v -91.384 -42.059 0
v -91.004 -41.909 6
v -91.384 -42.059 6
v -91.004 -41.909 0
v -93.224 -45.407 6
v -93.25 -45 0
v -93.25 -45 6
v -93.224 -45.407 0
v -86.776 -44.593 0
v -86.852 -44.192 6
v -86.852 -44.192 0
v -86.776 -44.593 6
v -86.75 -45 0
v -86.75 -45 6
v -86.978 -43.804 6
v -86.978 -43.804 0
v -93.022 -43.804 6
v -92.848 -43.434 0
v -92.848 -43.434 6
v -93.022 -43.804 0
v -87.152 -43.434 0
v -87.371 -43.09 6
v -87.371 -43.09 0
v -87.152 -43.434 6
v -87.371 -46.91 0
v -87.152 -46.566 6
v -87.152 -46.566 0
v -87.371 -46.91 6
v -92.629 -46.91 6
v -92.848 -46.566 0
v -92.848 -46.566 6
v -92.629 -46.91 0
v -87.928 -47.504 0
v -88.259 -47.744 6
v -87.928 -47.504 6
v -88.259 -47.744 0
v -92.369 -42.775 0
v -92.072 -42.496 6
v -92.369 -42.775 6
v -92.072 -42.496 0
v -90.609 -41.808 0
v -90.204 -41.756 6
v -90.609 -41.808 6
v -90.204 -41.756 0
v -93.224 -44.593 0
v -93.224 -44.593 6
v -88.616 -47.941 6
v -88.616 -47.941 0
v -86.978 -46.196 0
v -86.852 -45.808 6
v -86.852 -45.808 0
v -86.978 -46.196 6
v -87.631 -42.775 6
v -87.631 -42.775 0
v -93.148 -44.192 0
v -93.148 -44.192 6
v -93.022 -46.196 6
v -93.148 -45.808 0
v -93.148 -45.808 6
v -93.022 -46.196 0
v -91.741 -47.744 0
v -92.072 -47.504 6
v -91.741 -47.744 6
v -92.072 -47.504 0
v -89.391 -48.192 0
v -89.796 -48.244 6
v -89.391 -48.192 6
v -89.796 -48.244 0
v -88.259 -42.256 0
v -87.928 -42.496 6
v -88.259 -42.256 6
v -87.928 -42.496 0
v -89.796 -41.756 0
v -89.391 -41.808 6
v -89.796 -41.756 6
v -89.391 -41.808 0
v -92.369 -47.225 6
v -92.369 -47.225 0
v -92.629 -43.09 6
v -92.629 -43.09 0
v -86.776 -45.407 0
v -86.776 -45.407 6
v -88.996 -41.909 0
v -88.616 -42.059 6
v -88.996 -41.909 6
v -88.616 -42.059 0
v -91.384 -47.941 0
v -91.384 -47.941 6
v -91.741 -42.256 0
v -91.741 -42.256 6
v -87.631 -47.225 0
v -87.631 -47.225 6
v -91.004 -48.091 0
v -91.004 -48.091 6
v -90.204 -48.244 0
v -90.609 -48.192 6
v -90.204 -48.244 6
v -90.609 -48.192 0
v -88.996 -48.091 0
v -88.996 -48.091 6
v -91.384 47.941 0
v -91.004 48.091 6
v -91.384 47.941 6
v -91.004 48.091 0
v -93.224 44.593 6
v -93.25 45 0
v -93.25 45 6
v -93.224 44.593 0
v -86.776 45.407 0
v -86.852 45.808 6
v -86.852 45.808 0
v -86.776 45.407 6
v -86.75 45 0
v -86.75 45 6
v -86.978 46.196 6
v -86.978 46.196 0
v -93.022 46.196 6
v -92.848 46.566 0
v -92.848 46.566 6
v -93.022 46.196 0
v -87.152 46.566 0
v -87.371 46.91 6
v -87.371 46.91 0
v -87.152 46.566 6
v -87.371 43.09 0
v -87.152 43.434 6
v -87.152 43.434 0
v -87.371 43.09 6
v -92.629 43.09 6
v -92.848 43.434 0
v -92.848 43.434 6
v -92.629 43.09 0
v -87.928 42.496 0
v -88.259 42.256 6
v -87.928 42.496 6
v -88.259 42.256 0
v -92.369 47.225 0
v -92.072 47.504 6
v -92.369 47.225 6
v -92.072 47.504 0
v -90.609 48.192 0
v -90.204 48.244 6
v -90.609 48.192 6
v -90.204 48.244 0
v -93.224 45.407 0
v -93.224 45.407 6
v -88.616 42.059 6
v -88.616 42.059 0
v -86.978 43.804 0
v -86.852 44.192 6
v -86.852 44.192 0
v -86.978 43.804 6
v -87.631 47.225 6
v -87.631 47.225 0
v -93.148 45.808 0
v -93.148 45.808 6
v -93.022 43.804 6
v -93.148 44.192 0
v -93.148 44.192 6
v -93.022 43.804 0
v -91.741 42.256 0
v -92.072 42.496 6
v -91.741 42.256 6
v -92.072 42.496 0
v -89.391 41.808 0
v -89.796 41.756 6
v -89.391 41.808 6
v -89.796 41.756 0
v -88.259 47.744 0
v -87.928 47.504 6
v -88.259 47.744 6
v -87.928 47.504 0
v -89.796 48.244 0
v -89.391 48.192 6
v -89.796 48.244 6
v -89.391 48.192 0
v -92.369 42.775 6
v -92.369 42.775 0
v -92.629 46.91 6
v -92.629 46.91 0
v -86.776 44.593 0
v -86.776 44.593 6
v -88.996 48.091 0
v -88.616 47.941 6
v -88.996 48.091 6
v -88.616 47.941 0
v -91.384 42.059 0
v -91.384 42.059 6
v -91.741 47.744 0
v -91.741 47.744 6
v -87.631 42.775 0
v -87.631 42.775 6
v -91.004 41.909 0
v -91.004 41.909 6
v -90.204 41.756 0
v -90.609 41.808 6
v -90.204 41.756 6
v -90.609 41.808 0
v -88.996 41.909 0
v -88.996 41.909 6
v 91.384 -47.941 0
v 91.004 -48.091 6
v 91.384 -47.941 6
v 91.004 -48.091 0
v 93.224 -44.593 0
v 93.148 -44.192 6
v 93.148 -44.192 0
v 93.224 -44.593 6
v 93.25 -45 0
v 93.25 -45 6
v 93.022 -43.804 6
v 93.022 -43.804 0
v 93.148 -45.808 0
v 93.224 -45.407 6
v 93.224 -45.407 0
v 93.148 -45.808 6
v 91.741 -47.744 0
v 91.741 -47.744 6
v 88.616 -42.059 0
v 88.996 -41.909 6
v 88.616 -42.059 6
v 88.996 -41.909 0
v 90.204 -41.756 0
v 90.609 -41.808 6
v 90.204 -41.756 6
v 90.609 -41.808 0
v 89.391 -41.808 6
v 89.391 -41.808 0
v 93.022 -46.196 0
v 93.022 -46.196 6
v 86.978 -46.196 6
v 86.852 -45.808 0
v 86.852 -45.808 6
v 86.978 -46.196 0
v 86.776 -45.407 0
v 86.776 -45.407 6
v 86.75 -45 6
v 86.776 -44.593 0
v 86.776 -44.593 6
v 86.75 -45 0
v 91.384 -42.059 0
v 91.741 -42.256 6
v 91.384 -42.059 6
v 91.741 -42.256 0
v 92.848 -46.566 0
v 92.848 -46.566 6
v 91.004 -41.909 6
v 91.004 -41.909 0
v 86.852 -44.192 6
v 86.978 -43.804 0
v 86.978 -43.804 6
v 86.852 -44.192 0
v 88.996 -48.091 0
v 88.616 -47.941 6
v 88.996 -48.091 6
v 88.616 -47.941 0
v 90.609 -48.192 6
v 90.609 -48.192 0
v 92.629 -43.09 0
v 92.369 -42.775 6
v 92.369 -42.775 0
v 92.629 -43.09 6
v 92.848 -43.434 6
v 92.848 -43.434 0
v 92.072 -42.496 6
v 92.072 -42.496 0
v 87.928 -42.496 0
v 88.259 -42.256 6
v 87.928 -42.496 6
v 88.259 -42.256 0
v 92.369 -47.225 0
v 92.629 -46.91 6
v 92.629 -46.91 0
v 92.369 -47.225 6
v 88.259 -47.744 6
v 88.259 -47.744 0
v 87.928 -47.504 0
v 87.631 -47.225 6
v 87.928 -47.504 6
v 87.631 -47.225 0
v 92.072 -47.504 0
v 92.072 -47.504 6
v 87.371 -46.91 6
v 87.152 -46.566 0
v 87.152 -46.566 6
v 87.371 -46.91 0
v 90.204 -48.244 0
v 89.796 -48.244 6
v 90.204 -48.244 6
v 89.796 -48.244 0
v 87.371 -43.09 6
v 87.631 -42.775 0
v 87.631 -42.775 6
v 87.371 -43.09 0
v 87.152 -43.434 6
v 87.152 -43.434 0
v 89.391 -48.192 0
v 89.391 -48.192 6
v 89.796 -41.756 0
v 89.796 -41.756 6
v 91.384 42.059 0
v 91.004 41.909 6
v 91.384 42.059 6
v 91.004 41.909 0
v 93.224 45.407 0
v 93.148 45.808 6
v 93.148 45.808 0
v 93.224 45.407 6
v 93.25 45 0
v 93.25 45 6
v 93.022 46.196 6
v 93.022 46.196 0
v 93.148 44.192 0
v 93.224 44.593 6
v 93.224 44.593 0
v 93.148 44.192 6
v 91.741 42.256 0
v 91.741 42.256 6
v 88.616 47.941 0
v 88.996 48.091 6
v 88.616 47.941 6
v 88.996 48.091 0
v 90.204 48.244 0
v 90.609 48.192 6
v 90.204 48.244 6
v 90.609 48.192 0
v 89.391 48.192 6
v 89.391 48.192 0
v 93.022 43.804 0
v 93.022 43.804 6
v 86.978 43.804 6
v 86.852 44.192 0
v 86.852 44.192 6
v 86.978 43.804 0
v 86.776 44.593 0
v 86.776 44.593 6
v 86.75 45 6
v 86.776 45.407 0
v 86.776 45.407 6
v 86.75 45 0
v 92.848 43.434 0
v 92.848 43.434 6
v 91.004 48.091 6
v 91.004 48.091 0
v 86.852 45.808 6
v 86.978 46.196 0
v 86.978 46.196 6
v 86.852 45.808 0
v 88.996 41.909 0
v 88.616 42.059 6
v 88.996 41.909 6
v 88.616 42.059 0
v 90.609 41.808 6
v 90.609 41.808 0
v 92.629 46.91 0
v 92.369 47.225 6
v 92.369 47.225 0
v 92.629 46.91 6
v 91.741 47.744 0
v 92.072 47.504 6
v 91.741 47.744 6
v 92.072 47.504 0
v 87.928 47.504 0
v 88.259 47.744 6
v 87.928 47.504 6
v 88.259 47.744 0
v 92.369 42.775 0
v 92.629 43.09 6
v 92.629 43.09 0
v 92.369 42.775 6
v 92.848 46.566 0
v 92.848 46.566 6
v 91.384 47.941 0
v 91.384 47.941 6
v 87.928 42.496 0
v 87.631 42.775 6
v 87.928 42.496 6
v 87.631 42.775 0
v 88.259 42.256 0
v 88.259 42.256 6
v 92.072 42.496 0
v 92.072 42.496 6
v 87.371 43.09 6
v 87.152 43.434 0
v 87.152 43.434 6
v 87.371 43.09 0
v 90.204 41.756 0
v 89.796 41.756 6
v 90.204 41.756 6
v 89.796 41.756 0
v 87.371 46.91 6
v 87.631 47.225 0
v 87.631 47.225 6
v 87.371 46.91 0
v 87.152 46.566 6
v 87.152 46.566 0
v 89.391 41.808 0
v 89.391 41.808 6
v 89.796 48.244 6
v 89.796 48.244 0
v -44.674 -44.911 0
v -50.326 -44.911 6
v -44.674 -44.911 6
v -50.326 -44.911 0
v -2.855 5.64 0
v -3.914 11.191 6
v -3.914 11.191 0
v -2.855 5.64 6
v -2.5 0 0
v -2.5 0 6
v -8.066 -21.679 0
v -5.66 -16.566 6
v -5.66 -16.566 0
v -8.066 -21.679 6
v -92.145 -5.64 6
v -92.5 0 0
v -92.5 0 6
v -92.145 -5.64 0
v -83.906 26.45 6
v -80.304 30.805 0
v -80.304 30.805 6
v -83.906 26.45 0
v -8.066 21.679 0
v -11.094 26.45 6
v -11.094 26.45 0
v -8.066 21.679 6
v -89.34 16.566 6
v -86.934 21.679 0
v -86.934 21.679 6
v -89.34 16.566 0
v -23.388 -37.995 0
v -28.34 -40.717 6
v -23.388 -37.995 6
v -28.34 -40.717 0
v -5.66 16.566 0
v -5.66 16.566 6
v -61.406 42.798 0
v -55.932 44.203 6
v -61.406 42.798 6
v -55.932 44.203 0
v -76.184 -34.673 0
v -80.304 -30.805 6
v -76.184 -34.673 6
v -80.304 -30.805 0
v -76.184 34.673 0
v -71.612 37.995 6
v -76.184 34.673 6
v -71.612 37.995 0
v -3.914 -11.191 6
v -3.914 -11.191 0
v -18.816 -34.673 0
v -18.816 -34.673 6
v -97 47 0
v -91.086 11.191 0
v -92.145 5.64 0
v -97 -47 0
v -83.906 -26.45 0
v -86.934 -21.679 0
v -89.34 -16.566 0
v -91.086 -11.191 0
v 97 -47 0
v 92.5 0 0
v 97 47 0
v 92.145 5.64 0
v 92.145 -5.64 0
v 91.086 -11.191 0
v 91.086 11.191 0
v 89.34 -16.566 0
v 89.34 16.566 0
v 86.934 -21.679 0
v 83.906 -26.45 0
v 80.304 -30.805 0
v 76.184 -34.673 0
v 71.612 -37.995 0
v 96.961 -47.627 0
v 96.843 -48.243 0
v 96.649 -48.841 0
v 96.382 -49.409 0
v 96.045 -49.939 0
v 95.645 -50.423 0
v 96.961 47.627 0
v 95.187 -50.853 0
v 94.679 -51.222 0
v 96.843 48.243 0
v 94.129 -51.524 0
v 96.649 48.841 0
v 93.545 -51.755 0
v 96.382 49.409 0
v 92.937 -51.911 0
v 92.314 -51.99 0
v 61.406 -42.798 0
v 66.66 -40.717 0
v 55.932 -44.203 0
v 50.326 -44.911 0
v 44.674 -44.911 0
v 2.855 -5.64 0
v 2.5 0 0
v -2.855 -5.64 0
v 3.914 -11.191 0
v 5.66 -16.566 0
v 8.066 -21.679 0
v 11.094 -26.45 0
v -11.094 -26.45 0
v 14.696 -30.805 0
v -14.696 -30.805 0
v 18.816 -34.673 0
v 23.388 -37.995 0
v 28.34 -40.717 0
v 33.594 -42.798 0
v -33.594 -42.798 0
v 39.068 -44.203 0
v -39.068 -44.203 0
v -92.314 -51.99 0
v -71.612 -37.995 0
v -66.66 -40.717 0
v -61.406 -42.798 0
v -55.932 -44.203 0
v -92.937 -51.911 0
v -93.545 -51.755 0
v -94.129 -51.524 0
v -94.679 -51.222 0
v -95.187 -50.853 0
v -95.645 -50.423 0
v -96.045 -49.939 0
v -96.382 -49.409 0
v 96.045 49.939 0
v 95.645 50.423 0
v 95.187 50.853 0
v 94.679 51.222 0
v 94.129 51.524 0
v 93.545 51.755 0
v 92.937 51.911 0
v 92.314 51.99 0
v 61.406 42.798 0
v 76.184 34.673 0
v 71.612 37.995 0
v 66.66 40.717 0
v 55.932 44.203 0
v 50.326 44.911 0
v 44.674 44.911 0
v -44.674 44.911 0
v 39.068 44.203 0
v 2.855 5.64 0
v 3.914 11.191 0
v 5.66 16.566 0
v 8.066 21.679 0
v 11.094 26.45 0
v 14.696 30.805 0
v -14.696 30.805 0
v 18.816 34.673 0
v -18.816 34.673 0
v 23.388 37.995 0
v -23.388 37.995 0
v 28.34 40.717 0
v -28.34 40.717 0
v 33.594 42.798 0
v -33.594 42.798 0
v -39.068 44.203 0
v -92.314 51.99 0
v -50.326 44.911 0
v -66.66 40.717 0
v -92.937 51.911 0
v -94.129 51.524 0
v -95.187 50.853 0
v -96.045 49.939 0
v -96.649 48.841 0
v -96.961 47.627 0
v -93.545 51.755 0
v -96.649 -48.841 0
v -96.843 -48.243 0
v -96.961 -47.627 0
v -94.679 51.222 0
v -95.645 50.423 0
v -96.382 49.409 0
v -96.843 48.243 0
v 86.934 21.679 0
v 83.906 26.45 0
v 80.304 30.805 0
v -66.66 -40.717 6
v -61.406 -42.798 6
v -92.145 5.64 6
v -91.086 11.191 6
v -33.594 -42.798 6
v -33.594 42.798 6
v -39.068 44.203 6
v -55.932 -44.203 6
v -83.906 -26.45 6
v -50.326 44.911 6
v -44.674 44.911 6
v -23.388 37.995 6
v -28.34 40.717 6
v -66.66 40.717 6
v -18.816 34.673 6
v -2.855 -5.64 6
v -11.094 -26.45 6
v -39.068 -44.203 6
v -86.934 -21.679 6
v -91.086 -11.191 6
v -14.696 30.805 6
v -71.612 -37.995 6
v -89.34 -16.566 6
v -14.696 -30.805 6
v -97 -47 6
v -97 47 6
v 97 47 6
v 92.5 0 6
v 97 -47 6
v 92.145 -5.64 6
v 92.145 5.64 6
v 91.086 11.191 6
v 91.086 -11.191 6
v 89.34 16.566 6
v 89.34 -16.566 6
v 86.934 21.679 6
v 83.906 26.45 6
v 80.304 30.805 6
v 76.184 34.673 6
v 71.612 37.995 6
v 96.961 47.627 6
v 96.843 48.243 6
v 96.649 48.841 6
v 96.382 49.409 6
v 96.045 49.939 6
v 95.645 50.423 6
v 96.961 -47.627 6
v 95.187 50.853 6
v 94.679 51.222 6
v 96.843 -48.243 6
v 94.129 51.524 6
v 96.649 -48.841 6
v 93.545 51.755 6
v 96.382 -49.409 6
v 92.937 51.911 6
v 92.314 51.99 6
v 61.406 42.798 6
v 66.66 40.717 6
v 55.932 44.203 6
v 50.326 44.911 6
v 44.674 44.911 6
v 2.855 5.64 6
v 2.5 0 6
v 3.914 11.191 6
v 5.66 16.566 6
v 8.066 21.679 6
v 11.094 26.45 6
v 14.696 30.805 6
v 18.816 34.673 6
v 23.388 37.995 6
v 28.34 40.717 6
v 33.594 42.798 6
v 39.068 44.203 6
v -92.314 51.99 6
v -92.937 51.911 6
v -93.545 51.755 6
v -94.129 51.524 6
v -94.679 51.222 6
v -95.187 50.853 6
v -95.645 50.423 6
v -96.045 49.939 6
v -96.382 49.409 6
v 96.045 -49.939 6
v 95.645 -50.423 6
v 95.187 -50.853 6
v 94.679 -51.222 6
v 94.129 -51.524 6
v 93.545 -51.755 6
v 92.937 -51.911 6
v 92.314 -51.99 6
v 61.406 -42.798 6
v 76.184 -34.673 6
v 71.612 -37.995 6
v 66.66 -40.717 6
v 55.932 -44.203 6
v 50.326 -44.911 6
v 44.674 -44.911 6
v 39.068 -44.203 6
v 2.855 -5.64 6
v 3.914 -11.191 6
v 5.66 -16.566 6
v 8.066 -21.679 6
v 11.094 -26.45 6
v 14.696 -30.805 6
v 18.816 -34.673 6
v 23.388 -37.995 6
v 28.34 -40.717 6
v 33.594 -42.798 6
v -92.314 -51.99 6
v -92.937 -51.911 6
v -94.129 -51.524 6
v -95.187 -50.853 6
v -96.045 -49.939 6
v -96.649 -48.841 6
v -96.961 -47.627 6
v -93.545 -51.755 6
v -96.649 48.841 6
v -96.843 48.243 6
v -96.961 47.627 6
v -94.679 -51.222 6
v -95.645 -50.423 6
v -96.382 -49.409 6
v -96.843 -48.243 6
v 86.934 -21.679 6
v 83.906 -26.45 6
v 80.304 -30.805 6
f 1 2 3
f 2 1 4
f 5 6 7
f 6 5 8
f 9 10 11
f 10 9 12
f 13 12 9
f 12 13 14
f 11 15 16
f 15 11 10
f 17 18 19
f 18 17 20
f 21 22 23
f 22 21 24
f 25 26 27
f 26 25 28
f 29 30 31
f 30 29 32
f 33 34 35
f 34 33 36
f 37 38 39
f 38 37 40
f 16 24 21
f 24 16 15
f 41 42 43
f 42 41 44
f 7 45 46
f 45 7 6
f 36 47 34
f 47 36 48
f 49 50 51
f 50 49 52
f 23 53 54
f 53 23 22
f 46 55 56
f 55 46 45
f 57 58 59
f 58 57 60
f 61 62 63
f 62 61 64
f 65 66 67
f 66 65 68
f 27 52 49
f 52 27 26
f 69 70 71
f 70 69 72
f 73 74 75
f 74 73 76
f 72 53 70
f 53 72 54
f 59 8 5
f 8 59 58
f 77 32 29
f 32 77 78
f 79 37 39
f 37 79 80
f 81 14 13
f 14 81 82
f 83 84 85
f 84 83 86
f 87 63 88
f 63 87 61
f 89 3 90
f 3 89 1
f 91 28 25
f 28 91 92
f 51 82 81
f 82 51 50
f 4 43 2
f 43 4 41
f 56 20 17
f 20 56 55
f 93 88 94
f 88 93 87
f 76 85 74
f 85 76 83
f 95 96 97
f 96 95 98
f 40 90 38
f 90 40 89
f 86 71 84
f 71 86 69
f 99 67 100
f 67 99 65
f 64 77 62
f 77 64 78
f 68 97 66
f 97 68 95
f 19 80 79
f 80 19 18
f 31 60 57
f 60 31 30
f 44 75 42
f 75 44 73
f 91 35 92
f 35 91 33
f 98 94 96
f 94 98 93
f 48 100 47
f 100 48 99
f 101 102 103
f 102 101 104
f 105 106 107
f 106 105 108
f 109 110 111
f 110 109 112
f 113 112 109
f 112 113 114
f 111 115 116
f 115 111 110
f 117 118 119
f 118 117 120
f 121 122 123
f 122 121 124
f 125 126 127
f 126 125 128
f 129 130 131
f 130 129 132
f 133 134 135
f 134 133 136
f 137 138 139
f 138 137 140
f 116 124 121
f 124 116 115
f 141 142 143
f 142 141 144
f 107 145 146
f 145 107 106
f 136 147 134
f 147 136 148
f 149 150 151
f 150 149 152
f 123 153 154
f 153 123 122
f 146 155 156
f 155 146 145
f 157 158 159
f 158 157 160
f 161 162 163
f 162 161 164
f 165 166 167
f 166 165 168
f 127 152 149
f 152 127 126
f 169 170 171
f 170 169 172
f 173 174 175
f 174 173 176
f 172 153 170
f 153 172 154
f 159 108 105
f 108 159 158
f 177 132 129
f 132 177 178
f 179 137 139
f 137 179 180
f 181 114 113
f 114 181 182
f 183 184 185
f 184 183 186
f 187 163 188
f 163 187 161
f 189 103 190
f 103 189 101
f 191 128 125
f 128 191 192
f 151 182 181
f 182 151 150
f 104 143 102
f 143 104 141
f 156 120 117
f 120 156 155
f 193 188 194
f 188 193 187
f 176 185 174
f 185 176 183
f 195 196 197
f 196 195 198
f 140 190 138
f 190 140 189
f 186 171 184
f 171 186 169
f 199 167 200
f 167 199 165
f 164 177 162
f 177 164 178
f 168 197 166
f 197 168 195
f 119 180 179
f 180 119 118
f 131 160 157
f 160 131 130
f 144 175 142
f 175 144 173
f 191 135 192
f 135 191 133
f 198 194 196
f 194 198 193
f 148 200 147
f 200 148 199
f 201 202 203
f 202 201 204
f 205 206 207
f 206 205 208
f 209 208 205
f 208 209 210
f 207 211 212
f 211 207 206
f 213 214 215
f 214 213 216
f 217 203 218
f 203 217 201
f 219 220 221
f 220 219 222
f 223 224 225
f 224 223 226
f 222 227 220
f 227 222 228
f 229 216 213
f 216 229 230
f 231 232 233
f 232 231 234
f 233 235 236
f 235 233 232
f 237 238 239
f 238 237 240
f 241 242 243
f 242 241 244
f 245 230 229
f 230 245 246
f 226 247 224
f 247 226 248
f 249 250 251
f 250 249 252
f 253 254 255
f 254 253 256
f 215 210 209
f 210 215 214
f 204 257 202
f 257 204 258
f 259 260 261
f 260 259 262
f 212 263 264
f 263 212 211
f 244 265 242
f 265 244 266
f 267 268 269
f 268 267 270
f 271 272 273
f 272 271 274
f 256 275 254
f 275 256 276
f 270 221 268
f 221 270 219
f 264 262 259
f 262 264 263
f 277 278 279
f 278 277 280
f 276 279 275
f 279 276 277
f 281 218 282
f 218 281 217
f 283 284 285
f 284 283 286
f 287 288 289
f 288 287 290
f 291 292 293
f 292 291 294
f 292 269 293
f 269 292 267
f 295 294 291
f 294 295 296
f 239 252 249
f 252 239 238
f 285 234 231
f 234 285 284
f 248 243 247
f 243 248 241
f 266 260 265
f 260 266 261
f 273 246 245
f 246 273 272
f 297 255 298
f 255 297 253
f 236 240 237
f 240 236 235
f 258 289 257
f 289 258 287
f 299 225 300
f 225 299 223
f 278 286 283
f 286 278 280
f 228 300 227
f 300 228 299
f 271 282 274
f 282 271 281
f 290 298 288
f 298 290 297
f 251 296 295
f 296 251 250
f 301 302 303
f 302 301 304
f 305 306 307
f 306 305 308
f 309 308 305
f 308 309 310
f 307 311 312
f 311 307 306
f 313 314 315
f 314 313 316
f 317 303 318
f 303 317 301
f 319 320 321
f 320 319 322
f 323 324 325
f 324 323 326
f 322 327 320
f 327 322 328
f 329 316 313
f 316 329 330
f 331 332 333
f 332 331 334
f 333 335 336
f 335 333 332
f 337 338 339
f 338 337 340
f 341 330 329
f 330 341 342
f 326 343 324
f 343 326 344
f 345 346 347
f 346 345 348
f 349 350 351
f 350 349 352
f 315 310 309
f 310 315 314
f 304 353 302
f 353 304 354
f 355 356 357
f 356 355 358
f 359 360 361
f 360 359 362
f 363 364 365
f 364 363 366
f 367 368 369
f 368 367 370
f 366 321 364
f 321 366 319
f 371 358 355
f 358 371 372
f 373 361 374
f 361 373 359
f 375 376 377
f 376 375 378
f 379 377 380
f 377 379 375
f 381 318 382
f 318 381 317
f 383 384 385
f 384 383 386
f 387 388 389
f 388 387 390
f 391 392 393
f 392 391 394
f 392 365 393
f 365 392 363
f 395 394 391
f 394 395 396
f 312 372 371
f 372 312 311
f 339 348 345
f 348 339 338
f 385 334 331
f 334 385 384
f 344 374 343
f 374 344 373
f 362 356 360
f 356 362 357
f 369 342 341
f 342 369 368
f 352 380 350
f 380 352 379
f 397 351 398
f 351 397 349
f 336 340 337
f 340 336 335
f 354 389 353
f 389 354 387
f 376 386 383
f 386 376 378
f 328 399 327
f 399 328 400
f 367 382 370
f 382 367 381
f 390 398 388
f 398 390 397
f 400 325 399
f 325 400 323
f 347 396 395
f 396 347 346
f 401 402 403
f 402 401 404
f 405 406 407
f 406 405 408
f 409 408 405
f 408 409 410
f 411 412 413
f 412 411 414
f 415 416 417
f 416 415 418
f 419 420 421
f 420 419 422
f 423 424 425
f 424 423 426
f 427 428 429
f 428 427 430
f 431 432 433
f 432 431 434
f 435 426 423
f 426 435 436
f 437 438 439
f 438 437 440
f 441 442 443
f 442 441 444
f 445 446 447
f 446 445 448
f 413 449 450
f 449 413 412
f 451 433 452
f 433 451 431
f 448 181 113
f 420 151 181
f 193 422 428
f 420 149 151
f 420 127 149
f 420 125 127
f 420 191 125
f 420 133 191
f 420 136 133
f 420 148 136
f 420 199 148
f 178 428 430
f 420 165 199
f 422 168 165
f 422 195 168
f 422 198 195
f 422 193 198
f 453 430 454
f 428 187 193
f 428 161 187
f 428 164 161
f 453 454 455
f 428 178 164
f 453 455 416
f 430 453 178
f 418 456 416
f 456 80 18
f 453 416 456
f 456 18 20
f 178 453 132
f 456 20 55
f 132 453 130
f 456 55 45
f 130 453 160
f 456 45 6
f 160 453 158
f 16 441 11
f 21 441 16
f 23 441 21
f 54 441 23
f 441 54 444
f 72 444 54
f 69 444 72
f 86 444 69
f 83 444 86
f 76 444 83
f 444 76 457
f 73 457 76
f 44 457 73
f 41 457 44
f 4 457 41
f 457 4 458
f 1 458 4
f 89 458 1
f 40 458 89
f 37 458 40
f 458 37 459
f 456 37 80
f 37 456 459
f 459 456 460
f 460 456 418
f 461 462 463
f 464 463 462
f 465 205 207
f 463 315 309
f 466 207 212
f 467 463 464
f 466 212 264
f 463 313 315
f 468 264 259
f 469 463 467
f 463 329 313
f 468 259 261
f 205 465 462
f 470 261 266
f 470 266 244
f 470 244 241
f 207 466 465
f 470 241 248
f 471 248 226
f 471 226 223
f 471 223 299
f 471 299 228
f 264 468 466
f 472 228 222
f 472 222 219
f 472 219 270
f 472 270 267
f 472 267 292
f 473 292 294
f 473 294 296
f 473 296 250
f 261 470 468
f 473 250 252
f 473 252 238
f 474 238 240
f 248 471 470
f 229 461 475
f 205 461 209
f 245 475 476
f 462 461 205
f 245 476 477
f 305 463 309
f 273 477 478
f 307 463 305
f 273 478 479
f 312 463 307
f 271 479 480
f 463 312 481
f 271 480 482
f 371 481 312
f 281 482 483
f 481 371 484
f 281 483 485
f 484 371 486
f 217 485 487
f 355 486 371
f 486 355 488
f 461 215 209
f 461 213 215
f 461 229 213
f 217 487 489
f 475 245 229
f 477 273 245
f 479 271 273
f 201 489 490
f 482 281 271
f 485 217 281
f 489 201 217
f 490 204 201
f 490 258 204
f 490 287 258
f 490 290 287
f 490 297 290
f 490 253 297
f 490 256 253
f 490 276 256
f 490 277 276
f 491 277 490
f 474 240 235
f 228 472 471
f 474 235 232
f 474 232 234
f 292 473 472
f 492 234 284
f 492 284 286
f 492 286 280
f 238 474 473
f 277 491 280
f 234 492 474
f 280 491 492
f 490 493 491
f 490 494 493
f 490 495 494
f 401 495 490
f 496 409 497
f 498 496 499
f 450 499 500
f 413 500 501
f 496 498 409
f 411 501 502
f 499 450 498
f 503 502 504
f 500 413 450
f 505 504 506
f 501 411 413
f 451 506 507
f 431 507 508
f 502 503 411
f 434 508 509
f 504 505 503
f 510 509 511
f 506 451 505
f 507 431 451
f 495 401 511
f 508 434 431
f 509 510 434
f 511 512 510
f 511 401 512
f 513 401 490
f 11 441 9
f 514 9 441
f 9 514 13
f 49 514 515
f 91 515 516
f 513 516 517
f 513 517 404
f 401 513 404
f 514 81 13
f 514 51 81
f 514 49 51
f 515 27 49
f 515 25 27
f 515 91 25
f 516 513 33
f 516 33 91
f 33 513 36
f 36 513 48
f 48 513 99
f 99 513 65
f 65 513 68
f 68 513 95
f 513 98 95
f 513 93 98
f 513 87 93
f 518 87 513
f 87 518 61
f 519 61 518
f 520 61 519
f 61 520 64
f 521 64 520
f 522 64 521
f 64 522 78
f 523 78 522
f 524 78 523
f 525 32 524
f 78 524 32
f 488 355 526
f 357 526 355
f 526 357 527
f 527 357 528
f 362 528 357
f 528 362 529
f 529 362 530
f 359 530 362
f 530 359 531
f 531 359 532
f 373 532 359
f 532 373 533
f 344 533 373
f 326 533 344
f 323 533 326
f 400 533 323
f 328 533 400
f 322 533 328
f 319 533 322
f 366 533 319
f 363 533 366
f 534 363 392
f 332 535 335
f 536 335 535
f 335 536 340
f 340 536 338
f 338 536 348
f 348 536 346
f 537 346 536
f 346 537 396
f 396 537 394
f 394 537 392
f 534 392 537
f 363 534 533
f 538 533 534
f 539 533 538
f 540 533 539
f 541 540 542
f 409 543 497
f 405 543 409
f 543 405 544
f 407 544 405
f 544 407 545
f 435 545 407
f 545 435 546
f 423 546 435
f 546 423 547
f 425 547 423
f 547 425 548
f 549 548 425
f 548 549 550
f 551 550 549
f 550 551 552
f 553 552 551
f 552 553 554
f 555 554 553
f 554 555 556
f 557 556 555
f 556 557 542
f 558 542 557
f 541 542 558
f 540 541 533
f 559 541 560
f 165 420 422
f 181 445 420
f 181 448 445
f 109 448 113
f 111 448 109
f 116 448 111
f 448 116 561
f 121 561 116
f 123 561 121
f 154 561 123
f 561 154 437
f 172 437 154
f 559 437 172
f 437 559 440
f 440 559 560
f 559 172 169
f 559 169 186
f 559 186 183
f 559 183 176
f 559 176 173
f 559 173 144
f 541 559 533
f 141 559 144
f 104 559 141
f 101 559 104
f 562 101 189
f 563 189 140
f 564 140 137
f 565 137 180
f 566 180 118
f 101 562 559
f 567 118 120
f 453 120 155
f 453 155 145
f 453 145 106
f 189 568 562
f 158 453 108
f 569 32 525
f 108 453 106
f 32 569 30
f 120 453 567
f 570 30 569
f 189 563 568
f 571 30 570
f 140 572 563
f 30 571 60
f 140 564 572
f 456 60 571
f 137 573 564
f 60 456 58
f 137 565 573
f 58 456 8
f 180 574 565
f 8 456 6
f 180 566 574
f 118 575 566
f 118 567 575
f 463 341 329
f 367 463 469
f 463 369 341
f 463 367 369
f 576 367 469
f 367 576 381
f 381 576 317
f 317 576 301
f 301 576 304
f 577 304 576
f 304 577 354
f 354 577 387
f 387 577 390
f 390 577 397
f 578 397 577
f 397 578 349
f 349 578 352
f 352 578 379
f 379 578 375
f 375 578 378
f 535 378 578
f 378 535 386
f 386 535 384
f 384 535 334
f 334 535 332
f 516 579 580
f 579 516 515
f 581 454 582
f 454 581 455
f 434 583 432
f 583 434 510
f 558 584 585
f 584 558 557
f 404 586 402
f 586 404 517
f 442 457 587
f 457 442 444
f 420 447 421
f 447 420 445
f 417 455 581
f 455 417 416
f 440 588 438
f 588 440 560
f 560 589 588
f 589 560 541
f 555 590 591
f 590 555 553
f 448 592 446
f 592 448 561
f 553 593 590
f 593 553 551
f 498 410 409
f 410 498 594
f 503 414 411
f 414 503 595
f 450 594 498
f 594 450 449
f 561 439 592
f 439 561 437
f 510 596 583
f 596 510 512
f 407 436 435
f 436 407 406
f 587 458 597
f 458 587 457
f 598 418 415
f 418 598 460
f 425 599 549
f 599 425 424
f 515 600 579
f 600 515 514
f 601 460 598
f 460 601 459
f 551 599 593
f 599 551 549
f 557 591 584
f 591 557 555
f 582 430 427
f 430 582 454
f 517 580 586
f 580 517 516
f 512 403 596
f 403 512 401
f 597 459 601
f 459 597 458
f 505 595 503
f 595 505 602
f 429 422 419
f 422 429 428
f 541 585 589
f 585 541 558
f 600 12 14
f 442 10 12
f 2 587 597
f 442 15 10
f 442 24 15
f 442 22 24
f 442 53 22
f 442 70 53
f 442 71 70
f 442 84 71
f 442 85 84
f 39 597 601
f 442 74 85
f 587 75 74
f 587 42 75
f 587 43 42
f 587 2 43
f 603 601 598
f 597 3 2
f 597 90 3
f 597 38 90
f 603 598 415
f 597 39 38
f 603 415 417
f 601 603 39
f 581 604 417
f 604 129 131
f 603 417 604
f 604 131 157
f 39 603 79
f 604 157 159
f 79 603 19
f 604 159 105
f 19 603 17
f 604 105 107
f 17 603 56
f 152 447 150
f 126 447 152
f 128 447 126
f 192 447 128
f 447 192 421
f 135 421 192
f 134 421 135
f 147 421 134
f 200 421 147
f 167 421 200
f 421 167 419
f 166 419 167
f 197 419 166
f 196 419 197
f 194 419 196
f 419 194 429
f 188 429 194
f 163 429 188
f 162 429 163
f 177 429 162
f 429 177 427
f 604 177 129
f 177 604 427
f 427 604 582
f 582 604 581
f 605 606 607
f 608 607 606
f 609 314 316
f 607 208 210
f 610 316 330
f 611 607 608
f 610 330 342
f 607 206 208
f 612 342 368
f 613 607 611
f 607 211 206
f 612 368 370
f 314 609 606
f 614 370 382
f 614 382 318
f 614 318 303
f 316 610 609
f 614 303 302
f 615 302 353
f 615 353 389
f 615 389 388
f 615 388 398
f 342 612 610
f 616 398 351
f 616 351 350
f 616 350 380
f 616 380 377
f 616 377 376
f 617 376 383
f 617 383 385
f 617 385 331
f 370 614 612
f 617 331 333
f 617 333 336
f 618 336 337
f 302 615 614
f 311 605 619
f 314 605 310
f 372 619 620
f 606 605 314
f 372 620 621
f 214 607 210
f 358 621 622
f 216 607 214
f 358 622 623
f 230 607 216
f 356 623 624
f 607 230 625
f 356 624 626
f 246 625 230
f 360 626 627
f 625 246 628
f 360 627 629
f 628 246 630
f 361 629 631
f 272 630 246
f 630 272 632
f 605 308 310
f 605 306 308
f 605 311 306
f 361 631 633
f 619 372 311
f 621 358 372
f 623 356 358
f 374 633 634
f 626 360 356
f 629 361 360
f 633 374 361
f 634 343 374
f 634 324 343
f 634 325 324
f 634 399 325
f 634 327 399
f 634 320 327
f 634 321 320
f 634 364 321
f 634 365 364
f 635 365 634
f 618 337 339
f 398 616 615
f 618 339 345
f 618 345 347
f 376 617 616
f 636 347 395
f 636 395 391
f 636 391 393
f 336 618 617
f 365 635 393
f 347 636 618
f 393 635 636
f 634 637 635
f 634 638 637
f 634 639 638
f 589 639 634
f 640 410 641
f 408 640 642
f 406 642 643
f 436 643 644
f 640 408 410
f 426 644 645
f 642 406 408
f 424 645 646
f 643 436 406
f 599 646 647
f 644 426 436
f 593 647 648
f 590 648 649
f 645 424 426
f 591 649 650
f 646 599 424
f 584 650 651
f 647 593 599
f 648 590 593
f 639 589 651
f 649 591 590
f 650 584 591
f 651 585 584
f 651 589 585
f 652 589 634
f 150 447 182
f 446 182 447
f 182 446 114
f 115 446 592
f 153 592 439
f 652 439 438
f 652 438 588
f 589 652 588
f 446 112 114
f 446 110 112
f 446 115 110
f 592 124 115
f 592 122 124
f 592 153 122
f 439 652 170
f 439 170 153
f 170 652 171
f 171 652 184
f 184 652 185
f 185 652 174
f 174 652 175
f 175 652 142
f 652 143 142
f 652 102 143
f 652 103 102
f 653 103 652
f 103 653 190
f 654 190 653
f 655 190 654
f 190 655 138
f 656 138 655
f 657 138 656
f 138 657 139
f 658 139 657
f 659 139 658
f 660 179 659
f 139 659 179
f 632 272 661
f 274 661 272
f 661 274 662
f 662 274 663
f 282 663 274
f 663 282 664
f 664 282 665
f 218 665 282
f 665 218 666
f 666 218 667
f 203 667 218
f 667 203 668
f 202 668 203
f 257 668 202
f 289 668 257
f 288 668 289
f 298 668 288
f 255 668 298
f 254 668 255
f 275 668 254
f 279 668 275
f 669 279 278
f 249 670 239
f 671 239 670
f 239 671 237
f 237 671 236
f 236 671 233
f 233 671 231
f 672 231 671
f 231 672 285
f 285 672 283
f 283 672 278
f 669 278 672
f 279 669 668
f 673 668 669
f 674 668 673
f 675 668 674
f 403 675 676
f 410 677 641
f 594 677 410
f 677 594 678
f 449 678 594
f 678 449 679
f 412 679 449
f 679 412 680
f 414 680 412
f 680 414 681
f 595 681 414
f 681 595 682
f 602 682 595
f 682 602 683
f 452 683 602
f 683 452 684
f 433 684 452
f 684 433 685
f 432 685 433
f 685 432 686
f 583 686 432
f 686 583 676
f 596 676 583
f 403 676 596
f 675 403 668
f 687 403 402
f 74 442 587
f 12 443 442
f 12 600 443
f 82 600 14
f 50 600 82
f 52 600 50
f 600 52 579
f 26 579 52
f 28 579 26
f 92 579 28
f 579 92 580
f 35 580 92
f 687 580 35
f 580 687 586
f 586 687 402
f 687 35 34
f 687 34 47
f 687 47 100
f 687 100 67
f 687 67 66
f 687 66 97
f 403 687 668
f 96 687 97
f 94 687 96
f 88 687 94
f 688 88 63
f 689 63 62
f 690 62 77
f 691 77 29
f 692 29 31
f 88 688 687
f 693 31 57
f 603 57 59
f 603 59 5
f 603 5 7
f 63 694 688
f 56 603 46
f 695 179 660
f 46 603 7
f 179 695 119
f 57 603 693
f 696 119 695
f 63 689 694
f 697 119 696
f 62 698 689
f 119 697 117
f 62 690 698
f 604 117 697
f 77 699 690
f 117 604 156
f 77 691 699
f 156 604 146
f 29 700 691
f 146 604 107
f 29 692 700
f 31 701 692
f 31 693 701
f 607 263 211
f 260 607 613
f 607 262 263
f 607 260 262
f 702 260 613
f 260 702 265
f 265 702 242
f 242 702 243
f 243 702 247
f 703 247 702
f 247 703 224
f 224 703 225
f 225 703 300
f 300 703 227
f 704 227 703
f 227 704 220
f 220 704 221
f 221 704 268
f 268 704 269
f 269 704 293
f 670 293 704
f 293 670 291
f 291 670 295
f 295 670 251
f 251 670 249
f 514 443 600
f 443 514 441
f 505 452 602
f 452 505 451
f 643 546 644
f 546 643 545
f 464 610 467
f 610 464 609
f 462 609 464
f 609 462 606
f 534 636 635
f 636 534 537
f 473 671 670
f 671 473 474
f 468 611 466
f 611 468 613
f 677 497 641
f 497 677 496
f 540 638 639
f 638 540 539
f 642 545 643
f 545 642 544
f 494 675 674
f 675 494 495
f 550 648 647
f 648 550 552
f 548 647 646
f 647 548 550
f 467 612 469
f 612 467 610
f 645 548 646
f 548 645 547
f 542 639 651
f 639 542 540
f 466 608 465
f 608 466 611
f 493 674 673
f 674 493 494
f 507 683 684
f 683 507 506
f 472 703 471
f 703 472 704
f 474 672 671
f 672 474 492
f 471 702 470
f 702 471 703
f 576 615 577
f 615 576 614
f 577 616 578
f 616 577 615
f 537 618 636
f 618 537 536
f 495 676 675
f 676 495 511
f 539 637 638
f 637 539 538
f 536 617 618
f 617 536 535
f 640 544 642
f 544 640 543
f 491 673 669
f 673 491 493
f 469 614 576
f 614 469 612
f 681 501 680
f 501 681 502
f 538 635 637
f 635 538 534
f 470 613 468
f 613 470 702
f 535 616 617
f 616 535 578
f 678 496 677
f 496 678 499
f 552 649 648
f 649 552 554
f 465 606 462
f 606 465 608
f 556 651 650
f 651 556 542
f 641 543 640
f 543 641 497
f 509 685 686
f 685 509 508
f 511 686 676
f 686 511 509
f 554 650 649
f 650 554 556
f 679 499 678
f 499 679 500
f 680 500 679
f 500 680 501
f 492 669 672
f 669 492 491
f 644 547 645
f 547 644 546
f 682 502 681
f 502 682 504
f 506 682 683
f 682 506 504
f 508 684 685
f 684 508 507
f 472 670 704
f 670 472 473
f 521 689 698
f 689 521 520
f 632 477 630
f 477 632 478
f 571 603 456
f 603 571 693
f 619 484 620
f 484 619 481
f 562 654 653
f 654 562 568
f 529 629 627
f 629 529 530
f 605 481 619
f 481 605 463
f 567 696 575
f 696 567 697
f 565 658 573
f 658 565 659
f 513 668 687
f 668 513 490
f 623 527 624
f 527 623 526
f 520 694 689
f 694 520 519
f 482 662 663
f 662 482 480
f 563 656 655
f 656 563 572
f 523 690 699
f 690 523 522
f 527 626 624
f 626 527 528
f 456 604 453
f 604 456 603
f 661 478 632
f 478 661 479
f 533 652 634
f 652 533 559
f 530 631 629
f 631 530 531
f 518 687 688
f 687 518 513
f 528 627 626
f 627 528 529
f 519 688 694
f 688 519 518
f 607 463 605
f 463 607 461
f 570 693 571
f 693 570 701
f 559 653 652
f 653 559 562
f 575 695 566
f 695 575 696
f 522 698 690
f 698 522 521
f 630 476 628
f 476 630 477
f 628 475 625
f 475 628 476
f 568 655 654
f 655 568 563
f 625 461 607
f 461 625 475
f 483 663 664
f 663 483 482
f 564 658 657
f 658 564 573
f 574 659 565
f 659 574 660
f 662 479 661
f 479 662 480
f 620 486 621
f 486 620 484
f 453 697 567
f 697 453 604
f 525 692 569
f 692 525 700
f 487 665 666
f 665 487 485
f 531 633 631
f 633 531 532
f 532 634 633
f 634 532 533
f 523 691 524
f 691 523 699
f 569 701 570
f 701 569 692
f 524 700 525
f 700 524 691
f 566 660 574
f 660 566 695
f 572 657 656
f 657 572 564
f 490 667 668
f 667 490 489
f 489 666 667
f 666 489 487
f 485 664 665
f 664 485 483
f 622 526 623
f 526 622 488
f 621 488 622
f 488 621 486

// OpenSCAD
$fn = 50;


difference() {
	union() {
		hull() {
			translate(v = [-92.0000000000, 47.0000000000, 0]) {
				cylinder(h = 6, r = 5);
			}
			translate(v = [92.0000000000, 47.0000000000, 0]) {
				cylinder(h = 6, r = 5);
			}
			translate(v = [-92.0000000000, -47.0000000000, 0]) {
				cylinder(h = 6, r = 5);
			}
			translate(v = [92.0000000000, -47.0000000000, 0]) {
				cylinder(h = 6, r = 5);
			}
		}
	}
	union() {
		#translate(v = [-90.0000000000, -45.0000000000, -100.0000000000]) {
			cylinder(h = 200, r = 3.2500000000);
		}
		#translate(v = [-90.0000000000, 45.0000000000, -100.0000000000]) {
			cylinder(h = 200, r = 3.2500000000);
		}
		#translate(v = [90.0000000000, -45.0000000000, -100.0000000000]) {
			cylinder(h = 200, r = 3.2500000000);
		}
		#translate(v = [90.0000000000, 45.0000000000, -100.0000000000]) {
			cylinder(h = 200, r = 3.2500000000);
		}
		#translate(v = [-47.5000000000, 0, 0]) {
			cylinder(h = 6, r = 45.0000000000);
		}
		#translate(v = [47.5000000000, 0, 0]) {
			cylinder(h = 6, r = 45.0000000000);
		}
	}
}
